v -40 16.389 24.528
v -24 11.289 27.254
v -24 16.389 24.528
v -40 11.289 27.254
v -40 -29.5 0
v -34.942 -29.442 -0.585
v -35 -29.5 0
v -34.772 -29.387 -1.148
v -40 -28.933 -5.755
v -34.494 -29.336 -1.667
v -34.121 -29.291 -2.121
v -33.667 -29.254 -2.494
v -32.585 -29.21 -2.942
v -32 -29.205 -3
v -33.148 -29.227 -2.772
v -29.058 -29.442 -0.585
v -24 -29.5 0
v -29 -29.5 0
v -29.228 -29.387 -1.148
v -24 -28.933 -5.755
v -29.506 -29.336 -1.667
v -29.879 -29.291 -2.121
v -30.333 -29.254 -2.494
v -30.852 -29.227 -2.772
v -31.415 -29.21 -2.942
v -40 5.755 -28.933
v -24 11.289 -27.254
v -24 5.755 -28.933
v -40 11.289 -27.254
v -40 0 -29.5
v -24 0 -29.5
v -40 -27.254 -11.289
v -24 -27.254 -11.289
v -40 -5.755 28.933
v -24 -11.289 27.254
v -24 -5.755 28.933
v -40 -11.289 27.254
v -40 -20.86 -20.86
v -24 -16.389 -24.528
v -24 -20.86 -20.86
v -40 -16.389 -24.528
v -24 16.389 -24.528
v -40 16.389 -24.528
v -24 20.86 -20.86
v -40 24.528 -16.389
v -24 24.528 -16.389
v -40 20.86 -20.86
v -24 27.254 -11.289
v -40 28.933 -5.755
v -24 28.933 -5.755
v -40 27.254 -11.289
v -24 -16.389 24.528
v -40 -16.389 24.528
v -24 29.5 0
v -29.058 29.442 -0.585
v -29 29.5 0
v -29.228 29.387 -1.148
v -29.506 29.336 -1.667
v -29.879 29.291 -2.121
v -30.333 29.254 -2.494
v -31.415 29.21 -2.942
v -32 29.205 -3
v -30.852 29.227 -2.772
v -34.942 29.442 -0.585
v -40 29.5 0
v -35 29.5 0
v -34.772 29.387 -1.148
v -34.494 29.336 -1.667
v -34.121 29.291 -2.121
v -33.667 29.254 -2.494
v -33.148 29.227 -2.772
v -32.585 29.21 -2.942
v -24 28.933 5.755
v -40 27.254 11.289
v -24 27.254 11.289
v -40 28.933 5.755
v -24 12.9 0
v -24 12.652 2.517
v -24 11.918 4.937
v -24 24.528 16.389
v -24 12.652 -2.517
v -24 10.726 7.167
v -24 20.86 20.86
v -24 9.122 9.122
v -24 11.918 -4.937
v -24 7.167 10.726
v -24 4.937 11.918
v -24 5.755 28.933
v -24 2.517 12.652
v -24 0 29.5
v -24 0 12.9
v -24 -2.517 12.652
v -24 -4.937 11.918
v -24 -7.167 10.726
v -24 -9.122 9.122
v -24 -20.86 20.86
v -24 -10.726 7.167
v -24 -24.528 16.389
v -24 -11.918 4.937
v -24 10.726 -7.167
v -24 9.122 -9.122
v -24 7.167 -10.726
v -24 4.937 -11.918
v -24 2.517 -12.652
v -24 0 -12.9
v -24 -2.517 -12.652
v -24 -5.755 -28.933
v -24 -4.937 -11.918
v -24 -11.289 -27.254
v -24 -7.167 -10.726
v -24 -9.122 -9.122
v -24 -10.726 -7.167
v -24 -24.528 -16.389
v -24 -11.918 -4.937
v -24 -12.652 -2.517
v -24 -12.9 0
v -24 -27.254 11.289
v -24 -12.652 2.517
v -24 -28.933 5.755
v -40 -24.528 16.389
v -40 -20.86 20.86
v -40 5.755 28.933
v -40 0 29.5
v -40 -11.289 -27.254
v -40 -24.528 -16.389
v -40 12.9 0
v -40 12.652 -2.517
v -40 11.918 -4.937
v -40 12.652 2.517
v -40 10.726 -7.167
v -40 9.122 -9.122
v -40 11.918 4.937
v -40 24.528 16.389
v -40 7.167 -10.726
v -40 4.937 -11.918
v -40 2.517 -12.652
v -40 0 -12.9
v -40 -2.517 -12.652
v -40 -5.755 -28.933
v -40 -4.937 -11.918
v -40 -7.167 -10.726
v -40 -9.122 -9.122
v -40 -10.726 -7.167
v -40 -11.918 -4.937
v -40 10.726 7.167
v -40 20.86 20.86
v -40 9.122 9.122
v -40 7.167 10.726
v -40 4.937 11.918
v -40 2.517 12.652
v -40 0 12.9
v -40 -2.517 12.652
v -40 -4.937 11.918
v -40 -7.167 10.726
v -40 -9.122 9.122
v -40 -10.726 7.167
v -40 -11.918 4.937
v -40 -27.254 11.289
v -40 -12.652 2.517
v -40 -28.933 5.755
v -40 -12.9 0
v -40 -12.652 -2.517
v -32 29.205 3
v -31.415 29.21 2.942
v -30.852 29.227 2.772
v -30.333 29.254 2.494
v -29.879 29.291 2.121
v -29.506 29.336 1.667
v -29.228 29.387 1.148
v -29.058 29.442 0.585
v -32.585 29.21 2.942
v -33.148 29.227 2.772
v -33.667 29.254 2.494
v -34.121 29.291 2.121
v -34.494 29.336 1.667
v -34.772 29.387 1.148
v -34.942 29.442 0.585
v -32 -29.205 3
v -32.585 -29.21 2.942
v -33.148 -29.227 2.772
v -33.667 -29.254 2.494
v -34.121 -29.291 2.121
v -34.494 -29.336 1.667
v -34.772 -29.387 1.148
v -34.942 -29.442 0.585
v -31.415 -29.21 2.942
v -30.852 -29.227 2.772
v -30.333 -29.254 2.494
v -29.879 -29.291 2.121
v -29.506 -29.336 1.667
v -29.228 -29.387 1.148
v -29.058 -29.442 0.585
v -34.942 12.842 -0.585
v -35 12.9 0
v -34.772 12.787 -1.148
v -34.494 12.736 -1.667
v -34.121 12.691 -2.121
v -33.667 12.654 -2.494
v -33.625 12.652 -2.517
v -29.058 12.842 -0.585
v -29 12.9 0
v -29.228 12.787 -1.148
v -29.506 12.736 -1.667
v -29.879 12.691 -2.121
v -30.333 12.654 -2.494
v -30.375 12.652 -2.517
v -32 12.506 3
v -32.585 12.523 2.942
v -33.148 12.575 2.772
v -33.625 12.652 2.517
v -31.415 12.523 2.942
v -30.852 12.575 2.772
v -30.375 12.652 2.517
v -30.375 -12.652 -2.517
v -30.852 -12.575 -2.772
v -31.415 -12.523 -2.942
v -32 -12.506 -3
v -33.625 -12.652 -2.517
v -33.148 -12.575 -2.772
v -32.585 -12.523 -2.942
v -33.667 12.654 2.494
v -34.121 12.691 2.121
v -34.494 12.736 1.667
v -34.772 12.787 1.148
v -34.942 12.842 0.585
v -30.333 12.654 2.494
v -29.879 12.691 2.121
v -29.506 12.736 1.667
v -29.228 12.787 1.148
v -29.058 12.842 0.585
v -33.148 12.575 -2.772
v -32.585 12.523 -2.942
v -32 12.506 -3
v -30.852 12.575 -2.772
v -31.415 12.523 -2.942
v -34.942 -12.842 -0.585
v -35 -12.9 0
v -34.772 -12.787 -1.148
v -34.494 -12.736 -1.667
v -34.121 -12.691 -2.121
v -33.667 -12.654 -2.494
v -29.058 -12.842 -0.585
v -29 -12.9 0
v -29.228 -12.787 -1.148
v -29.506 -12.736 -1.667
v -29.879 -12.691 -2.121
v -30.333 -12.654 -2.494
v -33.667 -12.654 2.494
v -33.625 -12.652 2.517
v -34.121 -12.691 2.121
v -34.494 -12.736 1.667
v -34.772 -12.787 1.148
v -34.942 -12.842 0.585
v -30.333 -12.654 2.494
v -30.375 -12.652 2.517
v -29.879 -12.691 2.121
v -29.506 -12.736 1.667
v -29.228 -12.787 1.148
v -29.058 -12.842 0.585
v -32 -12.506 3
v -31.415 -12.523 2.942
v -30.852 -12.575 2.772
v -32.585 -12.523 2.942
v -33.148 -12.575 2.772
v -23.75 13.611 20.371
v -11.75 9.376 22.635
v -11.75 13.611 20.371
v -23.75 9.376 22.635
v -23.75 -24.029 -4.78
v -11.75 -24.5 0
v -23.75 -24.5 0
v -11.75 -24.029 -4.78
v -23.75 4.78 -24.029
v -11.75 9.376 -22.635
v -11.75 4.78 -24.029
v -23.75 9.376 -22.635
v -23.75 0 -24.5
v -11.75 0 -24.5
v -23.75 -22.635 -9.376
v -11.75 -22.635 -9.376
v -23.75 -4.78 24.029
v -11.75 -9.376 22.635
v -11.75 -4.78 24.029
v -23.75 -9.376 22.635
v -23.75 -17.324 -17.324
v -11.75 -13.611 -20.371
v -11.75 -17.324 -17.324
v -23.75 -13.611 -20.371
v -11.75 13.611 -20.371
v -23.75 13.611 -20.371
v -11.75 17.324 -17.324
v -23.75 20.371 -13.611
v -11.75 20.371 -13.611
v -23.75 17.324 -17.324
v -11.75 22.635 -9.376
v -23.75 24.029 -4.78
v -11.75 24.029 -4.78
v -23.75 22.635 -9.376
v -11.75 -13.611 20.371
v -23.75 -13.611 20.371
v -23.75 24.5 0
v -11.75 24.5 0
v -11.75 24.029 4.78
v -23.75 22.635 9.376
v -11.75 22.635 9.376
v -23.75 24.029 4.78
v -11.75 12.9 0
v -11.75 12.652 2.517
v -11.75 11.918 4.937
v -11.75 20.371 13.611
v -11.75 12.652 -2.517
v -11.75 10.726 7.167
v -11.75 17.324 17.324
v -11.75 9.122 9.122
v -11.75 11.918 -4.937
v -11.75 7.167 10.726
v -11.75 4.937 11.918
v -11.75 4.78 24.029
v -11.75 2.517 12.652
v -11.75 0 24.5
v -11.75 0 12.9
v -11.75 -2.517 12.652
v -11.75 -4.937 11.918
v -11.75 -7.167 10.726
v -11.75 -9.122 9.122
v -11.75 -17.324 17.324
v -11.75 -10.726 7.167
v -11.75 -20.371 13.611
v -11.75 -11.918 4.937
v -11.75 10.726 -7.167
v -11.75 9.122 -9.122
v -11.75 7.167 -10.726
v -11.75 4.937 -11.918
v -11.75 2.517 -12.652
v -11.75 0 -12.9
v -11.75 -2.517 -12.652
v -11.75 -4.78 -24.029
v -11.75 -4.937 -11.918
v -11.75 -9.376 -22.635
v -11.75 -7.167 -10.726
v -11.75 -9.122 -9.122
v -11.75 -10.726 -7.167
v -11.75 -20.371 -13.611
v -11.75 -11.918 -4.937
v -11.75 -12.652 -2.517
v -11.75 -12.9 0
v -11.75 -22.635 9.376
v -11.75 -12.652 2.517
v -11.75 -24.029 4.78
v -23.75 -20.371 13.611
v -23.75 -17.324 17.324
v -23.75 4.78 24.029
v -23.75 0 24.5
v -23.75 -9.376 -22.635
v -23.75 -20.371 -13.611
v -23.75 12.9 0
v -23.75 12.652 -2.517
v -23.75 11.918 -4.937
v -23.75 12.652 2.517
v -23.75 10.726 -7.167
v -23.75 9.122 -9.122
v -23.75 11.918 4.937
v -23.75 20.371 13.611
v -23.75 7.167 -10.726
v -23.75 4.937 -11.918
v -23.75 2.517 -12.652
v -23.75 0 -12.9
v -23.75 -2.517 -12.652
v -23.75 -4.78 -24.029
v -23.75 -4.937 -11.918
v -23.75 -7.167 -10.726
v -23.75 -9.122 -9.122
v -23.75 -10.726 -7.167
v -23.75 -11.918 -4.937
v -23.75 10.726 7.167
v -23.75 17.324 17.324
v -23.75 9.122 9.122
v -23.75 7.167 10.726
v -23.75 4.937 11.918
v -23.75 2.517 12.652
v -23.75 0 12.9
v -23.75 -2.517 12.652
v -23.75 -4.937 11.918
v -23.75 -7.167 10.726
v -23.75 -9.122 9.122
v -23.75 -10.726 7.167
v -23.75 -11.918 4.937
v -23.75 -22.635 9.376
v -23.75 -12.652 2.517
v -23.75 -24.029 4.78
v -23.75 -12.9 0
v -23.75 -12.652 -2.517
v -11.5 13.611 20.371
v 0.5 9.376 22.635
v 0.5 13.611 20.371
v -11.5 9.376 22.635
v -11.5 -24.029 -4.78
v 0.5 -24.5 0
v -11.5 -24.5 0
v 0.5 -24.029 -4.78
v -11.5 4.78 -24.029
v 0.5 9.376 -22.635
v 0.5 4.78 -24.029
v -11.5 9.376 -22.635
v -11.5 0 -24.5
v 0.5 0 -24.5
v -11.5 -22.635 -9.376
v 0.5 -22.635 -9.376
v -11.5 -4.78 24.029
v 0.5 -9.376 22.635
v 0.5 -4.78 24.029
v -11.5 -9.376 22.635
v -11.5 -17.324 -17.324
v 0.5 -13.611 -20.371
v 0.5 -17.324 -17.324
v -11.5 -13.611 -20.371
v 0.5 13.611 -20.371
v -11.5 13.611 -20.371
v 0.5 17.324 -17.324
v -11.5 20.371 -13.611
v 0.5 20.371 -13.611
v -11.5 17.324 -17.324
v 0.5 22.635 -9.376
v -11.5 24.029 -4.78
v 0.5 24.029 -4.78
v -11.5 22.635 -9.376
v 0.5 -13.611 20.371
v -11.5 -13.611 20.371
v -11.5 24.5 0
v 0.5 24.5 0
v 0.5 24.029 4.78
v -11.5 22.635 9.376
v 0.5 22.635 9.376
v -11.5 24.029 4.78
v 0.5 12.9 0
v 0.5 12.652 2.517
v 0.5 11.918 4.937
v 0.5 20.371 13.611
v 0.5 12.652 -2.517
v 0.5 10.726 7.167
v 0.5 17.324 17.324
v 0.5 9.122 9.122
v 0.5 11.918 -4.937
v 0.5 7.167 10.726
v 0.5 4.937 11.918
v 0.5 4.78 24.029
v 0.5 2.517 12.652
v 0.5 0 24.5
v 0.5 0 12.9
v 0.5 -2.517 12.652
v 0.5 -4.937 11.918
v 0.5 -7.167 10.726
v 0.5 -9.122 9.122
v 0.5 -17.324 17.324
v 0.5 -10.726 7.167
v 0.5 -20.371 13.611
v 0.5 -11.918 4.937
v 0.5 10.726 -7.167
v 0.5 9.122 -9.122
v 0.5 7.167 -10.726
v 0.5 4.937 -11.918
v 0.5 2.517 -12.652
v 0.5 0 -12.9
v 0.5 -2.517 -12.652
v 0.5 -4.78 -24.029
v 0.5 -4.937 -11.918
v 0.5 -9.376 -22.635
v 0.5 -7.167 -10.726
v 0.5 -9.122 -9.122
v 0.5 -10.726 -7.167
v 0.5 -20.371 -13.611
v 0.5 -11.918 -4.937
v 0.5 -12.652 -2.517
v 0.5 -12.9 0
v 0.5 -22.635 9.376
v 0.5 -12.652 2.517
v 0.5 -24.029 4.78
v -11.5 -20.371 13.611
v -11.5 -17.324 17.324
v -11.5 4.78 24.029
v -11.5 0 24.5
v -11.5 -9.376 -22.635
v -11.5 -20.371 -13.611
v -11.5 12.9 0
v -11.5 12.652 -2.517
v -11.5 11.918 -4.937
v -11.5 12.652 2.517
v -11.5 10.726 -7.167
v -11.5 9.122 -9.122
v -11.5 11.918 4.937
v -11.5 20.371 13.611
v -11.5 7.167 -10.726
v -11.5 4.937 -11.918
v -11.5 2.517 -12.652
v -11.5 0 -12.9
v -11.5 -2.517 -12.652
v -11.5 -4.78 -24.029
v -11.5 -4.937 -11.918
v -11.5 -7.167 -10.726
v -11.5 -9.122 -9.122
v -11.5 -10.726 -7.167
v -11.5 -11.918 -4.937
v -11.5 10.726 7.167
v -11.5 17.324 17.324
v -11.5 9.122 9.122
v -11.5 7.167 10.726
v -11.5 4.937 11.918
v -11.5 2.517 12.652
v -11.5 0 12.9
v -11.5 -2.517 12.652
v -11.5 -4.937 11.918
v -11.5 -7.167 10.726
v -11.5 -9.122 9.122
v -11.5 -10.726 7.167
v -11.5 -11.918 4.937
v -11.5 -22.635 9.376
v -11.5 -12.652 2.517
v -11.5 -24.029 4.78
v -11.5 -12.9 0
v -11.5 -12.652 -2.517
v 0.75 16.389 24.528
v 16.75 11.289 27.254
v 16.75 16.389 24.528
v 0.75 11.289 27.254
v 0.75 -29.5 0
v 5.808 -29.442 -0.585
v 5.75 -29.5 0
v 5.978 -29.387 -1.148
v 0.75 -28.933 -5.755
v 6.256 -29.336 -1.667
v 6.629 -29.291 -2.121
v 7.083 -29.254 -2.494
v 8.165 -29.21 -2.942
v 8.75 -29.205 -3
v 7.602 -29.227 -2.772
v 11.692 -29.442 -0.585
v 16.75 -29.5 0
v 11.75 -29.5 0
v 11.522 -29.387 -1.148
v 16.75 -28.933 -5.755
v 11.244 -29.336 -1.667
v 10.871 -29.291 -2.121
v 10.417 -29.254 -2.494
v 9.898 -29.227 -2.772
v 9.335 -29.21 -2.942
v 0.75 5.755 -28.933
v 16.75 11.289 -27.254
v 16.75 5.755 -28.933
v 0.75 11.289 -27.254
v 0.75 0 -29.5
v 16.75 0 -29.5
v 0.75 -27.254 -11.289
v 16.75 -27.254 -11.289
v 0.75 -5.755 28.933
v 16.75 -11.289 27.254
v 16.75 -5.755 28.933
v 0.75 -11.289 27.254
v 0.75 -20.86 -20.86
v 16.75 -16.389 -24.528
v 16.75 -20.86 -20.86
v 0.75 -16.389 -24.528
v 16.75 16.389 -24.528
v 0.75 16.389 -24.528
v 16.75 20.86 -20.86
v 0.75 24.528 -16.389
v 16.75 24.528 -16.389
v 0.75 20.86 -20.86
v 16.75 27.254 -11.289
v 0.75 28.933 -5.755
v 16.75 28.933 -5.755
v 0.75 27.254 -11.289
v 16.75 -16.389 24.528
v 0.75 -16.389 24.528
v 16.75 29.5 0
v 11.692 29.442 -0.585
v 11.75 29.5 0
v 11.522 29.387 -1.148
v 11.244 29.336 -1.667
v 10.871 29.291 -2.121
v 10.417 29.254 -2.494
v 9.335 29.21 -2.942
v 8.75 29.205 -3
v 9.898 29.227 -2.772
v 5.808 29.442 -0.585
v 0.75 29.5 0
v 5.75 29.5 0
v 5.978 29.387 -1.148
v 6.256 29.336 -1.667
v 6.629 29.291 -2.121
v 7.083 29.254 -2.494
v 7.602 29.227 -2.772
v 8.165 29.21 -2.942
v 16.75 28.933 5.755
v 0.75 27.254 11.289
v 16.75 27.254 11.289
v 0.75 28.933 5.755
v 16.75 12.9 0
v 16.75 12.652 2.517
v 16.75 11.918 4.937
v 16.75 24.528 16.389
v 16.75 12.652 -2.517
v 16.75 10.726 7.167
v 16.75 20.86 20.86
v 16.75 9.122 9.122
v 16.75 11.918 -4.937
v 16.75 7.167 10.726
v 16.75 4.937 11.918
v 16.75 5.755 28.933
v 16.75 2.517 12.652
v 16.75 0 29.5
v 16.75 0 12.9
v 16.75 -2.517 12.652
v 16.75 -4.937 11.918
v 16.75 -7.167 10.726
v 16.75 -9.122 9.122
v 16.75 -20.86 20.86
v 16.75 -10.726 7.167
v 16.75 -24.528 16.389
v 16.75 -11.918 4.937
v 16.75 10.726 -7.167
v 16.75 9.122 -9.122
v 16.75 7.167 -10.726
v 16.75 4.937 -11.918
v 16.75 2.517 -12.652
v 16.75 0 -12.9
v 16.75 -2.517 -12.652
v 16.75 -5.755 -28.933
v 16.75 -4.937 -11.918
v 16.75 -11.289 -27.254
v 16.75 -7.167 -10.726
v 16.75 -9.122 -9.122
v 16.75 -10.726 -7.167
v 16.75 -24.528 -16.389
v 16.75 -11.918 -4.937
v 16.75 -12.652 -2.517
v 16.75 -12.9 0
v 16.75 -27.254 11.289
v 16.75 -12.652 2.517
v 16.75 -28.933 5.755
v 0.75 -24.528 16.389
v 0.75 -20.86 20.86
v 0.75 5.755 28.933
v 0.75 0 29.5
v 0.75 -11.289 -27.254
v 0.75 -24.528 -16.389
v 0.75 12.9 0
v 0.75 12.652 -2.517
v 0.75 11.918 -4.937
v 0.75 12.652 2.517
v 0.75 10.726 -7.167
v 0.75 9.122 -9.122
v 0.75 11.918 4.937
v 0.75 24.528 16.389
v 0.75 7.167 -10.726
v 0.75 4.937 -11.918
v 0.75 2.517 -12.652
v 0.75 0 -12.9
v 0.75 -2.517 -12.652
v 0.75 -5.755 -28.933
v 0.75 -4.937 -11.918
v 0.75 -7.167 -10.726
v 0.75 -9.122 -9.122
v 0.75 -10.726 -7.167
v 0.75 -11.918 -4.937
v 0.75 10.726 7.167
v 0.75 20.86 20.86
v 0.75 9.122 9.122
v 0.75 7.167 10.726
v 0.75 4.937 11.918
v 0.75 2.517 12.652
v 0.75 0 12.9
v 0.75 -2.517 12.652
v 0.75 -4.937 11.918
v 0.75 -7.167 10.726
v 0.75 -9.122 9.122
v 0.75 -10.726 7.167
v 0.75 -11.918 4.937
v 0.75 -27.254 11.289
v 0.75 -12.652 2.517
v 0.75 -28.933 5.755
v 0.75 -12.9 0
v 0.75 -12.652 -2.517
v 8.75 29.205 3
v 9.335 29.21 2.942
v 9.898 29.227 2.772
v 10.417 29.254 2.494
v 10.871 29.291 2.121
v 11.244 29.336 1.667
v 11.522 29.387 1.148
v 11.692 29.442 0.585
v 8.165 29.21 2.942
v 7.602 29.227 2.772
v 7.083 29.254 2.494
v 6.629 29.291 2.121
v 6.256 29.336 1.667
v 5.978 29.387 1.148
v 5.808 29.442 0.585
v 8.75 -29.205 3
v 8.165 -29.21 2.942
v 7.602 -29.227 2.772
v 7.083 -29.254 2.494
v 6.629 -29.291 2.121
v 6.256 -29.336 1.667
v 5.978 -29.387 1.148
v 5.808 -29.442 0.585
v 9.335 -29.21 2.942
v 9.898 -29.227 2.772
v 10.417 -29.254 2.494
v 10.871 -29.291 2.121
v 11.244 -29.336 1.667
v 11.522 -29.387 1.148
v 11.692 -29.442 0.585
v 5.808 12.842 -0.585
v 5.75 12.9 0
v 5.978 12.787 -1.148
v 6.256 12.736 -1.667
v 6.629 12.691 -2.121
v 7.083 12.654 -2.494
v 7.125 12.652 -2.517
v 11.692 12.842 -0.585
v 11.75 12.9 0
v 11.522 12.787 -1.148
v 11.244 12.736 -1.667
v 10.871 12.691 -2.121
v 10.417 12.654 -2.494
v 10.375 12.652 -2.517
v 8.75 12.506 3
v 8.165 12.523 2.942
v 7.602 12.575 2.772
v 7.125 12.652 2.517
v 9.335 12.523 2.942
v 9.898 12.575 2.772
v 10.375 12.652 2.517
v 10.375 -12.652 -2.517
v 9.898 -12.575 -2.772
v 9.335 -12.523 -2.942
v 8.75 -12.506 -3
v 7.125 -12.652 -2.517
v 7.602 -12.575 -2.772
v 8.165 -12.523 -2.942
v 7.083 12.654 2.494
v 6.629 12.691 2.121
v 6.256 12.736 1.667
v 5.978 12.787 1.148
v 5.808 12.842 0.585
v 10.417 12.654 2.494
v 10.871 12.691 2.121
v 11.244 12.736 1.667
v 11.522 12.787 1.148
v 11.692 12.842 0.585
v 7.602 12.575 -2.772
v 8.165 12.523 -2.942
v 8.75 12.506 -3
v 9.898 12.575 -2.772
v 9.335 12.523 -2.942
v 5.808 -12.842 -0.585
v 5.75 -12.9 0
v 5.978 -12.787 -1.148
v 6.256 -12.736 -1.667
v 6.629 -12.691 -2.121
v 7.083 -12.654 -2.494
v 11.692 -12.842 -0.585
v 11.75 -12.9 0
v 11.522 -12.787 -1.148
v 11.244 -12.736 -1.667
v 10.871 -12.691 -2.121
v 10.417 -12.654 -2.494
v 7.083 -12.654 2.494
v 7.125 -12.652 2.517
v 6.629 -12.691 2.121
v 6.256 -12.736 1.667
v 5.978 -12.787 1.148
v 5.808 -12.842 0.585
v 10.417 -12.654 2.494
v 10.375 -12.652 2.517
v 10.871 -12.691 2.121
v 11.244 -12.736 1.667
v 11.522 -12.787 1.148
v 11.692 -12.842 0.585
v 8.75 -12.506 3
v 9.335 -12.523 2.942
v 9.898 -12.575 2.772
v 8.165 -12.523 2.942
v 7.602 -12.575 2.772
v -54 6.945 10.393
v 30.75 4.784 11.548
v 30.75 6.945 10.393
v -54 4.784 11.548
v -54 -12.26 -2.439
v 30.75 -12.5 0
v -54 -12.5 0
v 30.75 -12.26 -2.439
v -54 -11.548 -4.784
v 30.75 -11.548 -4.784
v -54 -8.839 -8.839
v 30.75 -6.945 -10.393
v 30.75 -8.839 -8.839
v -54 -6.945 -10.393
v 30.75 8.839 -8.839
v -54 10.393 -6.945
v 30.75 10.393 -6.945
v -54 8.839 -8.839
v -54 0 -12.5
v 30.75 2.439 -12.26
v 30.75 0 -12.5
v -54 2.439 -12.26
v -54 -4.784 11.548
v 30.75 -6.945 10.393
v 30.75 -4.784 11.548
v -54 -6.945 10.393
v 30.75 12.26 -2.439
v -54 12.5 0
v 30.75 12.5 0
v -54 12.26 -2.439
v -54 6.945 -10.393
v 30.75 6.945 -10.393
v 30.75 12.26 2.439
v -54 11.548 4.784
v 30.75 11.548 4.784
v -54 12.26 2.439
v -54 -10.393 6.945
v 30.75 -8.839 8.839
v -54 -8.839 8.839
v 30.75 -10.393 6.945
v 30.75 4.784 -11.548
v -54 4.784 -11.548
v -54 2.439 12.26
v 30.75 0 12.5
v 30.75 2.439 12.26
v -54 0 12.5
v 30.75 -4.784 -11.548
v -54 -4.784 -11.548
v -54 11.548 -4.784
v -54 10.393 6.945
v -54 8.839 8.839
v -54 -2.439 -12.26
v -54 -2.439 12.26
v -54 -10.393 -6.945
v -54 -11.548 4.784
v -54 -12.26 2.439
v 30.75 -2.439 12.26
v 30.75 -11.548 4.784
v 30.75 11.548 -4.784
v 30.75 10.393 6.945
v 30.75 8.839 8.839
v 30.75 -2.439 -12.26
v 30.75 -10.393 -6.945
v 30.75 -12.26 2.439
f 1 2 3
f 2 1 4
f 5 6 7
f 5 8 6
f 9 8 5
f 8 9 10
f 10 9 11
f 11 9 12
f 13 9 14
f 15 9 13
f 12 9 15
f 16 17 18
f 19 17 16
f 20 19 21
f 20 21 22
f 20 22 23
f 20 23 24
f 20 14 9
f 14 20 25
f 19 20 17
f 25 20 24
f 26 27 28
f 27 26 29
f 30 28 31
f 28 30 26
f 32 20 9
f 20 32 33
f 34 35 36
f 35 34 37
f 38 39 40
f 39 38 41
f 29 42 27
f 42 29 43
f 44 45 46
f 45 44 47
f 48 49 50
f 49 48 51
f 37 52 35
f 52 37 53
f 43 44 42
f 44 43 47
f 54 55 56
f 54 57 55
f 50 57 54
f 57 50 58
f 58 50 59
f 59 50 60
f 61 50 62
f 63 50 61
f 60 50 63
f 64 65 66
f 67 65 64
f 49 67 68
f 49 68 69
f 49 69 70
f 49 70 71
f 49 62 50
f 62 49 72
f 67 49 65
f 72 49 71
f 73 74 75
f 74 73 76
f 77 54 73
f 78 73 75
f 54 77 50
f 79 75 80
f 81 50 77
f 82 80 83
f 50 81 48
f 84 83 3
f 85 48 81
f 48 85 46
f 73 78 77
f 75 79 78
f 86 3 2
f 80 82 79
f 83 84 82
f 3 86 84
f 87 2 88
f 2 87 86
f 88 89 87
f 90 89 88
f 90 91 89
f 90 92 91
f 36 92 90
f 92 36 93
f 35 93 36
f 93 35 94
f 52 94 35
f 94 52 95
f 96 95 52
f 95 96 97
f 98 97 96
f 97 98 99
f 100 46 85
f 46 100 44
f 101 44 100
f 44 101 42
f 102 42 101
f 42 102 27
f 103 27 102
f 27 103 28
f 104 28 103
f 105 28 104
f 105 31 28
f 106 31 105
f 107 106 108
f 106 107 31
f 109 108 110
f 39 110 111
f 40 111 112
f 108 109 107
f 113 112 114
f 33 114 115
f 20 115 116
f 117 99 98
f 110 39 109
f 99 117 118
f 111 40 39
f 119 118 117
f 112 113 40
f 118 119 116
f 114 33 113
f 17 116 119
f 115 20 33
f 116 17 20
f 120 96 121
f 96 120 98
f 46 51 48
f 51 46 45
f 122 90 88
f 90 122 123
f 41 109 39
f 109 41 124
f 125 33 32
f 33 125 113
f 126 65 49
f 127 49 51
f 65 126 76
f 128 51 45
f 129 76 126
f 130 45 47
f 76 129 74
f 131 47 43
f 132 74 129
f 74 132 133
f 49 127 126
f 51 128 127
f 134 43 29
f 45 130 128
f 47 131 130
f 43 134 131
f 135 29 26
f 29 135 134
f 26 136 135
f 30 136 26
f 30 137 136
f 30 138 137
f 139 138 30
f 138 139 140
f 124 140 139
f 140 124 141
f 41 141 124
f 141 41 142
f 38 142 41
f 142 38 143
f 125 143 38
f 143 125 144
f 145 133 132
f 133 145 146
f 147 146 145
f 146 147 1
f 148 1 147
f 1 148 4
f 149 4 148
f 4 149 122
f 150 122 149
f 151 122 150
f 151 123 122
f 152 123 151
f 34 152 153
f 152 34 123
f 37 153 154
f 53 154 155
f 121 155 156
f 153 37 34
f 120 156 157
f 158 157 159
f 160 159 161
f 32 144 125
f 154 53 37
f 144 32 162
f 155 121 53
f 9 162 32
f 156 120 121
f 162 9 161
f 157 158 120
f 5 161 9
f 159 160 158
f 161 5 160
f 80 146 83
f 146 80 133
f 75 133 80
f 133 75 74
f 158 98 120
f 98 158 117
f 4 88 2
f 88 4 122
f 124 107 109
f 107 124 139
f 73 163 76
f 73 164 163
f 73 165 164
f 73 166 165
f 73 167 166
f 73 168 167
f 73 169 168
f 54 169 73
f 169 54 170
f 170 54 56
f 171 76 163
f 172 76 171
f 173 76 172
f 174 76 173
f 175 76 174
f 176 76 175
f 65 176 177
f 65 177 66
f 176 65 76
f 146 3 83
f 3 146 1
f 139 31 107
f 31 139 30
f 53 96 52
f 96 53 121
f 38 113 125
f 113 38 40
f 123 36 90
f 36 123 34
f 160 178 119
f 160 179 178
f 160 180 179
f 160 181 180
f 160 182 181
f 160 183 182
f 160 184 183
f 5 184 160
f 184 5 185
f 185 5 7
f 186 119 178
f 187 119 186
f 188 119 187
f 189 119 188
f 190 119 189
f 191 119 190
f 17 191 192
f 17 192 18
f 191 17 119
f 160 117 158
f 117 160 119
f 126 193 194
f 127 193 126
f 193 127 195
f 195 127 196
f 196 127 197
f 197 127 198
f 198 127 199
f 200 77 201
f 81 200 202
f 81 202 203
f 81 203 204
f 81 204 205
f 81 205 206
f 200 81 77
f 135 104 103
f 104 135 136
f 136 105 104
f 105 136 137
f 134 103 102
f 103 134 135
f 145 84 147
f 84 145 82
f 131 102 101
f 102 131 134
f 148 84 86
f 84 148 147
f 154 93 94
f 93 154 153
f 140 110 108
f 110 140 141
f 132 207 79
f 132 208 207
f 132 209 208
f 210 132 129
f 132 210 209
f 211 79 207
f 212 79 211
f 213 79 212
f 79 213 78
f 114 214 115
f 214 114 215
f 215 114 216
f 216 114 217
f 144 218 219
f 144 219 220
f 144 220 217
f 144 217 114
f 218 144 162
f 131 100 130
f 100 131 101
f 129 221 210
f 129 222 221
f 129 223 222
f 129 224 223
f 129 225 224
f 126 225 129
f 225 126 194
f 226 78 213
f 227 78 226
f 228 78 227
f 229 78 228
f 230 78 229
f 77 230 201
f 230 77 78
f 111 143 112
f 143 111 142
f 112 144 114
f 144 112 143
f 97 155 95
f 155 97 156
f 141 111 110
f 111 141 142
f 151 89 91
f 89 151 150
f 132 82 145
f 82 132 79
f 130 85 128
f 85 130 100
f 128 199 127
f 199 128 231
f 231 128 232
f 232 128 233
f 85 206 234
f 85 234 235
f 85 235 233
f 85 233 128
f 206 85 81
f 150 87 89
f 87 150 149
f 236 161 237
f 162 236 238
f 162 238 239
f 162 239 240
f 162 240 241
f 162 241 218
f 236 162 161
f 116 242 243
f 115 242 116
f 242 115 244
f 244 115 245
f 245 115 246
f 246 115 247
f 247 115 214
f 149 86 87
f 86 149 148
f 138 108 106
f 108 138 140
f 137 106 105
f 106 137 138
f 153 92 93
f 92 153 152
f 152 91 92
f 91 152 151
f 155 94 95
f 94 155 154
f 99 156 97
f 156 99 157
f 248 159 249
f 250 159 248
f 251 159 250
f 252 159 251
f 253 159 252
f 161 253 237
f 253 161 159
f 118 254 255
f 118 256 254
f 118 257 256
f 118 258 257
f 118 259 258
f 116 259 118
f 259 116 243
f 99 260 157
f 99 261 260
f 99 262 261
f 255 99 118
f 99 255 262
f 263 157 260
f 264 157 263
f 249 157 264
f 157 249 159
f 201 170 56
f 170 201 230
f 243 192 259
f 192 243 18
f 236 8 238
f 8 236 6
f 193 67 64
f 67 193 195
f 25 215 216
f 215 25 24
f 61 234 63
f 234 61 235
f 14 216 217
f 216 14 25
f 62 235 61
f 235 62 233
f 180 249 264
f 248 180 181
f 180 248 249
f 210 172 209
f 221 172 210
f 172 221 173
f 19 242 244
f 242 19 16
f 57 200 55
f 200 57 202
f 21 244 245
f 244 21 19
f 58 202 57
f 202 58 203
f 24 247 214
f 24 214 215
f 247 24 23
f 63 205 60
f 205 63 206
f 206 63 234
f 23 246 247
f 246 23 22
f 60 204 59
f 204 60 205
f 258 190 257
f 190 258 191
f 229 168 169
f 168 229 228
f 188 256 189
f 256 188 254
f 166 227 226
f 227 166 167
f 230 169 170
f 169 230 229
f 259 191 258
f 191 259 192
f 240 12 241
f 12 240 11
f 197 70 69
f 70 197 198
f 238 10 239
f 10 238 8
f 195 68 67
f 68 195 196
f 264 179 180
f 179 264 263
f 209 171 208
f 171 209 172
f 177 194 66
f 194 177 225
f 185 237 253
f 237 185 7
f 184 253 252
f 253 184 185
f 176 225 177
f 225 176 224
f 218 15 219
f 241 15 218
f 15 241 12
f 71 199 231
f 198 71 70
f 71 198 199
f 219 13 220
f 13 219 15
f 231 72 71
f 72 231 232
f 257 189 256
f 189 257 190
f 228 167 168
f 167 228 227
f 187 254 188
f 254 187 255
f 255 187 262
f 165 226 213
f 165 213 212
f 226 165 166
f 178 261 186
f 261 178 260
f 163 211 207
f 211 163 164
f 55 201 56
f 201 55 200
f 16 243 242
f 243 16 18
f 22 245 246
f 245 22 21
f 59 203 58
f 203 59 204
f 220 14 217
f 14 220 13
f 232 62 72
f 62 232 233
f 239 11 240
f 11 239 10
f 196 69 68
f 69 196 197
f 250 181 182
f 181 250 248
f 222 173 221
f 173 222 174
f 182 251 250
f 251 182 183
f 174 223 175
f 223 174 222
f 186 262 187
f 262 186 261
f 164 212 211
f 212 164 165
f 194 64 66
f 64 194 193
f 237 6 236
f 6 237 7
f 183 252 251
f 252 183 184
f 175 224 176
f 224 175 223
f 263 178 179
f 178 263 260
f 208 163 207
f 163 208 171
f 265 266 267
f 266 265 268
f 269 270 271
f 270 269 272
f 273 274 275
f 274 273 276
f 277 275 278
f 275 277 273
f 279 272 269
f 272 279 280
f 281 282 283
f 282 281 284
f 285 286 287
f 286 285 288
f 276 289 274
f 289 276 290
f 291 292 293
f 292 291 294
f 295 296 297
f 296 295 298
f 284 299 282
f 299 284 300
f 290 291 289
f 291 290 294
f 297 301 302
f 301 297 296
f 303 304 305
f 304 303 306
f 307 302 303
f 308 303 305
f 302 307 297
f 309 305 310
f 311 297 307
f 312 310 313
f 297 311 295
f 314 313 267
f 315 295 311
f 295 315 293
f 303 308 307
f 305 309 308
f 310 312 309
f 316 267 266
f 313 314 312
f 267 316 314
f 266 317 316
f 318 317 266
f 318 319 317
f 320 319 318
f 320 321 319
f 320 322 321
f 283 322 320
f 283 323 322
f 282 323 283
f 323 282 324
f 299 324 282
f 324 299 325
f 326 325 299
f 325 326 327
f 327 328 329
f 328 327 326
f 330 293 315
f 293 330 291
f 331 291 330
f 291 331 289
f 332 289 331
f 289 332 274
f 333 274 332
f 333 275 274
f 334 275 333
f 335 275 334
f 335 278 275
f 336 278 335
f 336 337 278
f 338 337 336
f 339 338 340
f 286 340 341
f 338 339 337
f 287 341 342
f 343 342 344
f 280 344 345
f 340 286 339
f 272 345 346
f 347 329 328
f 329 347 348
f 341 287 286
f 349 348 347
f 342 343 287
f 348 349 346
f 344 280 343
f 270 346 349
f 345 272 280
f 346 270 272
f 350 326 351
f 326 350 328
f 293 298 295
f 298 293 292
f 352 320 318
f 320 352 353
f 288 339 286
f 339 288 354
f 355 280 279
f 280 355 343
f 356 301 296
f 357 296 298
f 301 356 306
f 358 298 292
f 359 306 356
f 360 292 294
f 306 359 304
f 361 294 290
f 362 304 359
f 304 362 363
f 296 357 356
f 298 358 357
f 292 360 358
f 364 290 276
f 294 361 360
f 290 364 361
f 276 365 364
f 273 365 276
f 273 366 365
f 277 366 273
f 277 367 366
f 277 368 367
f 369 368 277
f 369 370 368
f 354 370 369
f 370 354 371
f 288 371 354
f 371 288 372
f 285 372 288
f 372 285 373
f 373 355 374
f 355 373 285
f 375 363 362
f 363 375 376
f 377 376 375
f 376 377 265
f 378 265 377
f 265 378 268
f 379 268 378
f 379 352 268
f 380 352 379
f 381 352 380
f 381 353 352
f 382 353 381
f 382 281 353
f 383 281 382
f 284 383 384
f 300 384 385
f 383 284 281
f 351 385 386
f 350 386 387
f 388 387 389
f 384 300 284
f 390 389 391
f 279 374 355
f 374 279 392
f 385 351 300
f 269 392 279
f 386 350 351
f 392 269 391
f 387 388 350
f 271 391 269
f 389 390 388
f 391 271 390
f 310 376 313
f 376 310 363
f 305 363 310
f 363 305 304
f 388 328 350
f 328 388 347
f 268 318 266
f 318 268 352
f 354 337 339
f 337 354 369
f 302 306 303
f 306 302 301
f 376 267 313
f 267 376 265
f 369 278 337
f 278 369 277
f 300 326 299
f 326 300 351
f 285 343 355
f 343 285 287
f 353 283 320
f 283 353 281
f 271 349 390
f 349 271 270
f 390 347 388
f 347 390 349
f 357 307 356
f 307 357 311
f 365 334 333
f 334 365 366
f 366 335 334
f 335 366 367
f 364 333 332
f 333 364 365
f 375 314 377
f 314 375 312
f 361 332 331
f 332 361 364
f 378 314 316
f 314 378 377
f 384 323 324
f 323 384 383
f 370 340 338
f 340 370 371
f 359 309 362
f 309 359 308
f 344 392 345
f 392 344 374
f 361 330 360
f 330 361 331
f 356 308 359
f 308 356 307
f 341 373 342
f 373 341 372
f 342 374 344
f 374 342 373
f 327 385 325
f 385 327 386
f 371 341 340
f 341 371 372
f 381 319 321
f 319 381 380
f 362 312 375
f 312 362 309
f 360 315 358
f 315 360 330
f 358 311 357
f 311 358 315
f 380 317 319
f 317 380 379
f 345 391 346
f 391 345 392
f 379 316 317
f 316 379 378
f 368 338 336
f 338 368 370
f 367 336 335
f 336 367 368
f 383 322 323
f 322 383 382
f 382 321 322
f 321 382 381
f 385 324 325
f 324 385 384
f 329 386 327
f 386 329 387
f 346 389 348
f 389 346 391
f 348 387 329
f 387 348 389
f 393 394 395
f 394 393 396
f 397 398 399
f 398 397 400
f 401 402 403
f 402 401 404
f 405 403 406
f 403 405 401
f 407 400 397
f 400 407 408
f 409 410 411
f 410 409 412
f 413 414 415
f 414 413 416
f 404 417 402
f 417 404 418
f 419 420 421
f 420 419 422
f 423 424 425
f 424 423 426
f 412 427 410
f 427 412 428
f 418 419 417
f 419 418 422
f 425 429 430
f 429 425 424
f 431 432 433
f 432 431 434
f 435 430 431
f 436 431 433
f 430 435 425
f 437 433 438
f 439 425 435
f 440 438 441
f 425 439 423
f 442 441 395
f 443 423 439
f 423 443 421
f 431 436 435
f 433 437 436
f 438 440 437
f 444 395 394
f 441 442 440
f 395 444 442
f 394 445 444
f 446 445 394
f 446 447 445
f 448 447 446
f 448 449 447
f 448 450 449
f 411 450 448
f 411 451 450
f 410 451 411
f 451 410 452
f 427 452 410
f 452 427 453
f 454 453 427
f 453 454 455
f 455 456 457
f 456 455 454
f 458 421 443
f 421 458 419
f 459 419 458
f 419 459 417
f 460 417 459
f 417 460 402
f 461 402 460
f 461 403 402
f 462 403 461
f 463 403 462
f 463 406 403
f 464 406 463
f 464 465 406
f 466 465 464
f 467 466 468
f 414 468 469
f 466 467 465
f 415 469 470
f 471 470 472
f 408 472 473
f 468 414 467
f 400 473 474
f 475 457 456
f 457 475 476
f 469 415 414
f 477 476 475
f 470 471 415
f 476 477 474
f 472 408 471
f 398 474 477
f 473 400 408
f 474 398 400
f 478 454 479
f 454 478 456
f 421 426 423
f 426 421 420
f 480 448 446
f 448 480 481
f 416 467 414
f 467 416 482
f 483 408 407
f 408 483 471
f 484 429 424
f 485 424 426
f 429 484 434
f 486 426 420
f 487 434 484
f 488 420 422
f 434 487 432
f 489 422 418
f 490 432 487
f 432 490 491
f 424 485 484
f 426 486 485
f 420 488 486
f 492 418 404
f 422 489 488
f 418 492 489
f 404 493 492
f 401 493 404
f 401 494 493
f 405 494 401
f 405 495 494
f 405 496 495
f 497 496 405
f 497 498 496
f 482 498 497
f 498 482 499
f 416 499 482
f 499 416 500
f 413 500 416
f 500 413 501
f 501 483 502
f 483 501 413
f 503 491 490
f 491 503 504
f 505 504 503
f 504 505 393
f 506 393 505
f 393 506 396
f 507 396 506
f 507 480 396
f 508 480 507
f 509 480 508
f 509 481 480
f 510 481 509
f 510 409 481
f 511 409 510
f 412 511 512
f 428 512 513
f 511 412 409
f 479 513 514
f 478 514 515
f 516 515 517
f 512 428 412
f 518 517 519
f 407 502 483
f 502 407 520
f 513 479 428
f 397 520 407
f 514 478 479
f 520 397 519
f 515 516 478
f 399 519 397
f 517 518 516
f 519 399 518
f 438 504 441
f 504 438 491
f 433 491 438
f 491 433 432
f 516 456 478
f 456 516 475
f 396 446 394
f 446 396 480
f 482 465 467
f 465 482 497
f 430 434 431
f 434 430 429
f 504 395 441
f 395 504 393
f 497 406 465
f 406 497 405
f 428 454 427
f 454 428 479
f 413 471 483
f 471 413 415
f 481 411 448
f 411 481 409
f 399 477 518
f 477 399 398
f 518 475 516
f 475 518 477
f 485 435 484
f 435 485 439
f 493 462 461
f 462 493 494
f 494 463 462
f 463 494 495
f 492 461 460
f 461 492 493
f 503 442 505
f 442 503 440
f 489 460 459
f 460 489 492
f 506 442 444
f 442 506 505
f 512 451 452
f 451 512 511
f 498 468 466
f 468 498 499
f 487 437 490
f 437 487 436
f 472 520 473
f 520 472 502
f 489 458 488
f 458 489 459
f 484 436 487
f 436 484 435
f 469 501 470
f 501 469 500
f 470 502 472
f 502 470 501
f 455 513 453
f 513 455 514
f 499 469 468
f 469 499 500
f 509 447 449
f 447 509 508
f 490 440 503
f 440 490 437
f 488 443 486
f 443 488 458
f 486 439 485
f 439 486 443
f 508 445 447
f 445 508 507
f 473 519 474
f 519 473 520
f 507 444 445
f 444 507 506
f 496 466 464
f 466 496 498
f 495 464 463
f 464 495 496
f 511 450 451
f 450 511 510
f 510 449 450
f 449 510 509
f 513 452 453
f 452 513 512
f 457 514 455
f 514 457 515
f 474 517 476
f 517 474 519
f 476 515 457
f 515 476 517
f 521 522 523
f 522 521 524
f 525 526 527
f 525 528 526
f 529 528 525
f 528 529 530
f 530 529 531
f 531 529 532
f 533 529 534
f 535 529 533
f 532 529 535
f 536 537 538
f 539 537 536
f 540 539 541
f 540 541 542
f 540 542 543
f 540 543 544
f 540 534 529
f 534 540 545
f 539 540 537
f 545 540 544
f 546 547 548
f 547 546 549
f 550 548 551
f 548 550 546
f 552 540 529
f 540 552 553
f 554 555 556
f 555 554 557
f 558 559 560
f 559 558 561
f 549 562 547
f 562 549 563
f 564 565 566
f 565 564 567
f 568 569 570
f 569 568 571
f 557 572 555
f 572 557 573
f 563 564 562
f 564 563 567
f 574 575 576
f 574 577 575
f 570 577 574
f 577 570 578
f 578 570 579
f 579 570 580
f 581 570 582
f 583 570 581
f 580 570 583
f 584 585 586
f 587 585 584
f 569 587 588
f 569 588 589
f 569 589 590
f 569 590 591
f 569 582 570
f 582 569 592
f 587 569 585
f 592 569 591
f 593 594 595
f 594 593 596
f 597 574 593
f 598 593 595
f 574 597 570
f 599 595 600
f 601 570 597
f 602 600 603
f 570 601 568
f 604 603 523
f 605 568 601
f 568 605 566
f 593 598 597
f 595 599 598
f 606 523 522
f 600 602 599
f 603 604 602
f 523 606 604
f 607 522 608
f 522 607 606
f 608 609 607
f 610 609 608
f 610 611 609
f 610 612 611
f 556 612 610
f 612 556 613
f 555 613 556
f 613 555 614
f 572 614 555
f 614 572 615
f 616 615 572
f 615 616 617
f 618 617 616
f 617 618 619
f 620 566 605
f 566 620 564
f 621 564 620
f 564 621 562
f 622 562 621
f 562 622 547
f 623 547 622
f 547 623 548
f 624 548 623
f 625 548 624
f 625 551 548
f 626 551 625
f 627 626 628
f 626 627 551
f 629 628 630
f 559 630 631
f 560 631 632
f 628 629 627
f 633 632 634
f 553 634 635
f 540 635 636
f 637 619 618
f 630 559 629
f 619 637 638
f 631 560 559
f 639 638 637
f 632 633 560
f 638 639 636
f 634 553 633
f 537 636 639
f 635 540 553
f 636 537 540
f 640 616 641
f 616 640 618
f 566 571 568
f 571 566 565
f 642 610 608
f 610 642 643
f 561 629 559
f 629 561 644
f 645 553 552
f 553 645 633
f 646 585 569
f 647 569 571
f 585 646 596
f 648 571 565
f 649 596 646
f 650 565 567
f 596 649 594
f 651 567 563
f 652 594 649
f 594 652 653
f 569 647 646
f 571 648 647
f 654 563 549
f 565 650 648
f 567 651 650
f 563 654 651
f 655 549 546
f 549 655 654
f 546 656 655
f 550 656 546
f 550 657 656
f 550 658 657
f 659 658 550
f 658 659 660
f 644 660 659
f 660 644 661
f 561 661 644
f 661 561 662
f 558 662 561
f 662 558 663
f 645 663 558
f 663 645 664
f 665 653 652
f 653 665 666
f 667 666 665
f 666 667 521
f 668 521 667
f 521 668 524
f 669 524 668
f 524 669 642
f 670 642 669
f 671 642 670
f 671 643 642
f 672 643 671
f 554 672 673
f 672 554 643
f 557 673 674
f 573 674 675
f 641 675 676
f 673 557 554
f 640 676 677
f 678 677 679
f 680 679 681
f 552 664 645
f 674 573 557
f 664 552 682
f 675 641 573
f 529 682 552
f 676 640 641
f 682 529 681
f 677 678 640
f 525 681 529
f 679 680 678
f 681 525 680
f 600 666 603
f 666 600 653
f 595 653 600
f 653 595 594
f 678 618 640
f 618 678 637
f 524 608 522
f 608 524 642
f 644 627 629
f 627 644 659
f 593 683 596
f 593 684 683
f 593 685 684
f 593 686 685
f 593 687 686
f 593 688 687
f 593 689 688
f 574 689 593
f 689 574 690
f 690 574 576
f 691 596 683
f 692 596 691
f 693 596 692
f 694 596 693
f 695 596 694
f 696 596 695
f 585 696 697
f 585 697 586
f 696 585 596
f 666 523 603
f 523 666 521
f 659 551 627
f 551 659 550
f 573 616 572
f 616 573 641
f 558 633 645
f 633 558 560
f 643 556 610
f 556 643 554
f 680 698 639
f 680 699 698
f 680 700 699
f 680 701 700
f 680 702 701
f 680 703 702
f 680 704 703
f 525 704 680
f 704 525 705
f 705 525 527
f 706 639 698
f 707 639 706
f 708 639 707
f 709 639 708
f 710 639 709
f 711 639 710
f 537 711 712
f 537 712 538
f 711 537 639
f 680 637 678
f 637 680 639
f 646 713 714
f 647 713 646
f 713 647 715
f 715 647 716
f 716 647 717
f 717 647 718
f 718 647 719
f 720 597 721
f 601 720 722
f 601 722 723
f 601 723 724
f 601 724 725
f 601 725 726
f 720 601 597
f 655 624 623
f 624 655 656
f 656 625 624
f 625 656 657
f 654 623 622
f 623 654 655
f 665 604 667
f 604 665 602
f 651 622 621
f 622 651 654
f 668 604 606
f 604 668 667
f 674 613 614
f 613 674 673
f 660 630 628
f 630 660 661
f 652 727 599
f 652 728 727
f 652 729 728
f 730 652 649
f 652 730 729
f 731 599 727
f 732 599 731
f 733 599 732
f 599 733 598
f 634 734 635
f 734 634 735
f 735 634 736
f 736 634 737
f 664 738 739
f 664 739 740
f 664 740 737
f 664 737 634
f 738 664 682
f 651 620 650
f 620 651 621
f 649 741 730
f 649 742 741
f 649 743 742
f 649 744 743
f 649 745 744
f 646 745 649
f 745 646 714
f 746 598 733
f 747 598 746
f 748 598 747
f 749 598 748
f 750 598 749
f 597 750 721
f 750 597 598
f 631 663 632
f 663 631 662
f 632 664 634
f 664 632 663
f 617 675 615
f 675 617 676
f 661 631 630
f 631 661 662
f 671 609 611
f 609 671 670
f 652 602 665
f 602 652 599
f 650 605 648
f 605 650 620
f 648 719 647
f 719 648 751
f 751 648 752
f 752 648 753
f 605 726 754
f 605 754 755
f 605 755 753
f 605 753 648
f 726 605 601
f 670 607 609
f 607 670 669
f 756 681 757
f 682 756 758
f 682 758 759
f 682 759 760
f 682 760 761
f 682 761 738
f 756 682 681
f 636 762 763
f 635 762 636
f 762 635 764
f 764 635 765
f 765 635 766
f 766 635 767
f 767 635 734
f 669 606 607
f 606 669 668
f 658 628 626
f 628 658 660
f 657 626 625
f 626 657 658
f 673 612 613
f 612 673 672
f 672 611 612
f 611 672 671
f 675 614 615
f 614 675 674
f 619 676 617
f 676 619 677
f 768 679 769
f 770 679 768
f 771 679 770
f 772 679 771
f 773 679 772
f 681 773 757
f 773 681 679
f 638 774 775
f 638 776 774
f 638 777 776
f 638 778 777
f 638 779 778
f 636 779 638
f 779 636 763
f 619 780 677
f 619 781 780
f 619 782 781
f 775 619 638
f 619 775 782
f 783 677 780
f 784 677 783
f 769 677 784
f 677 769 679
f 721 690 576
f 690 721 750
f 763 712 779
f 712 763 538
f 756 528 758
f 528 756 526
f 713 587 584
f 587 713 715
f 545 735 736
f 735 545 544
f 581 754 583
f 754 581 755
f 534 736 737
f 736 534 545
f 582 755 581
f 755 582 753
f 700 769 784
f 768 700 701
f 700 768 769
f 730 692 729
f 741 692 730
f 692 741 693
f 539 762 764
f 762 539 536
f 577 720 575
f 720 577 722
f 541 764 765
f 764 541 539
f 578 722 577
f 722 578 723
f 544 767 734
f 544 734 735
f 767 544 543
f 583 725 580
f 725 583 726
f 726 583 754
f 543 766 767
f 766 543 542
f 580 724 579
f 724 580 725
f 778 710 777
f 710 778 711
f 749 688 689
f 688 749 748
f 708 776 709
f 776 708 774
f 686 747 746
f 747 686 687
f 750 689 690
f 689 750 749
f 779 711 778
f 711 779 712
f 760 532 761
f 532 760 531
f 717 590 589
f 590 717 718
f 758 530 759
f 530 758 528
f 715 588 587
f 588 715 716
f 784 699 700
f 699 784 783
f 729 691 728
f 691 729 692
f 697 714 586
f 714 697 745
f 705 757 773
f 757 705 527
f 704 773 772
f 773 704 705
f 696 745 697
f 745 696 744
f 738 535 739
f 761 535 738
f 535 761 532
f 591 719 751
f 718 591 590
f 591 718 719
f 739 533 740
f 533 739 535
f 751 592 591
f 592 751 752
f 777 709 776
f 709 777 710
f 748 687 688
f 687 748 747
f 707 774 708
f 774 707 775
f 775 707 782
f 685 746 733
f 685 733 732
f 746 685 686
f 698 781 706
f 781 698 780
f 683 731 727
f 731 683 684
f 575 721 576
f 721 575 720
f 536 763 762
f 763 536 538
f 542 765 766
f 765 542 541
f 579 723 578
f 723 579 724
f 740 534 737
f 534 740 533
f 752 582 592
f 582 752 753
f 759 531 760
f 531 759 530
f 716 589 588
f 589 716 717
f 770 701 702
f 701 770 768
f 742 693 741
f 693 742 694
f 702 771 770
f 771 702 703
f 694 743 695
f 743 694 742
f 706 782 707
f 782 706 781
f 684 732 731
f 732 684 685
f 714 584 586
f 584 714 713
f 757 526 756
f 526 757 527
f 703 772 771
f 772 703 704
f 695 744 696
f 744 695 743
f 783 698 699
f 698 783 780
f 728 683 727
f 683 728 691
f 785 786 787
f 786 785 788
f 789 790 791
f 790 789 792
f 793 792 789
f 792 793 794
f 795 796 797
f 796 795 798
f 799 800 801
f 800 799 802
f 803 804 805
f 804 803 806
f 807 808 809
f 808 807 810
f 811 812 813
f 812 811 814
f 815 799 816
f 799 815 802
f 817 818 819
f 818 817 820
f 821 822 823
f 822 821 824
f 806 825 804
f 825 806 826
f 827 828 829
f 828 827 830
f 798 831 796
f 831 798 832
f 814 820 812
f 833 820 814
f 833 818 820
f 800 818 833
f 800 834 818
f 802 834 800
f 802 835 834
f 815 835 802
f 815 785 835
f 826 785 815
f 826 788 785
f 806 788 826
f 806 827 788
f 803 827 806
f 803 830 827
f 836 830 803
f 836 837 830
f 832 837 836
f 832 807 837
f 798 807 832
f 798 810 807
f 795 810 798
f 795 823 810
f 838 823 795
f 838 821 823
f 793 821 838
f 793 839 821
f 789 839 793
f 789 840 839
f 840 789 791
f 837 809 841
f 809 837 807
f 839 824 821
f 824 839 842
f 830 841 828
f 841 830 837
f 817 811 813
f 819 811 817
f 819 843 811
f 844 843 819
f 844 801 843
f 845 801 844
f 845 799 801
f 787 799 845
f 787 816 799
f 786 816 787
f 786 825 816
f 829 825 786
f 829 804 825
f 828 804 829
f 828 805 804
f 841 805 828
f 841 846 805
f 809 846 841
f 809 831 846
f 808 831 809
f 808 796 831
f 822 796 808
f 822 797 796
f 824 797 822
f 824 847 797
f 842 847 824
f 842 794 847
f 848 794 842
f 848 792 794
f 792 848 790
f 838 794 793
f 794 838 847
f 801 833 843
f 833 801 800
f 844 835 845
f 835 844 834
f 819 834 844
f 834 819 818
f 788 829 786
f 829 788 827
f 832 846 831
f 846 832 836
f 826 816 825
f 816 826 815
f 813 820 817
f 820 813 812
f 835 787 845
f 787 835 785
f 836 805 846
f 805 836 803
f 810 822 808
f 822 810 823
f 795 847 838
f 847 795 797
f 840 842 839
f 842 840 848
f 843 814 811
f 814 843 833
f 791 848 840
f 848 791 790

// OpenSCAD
$fn = 32;

// ------------------------------------------------------------------------
// Shaft with rings and collars: d25 shaft, 4 rings
// Every part is its own module, assembly() places them once.
// ------------------------------------------------------------------------

// --- part 1 ---
module shaft() {
  translate([0, 0, -42.375]) cylinder(h = 84.75, d = 25);
}

// --- part 2 ---
module collar_a() {
  difference() {
    cylinder(h = 16, d = 59);
    translate([0, 0, -1]) cylinder(h = 18, d = 25.8);
    translate([0, 0, 8]) rotate([90, 0, 0]) cylinder(h = 61, d = 6, center = true);
  }
}

// --- part 3 ---
module spacer_a() {
  difference() {
      translate([0, 0, 0]) cylinder(h = 12, d = 49);
      translate([0, 0, -1]) cylinder(h = 14, d = 25.8);
    }
}

// --- part 4 ---
module spacer_b() {
  difference() {
      translate([0, 0, 0]) cylinder(h = 12, d = 49);
      translate([0, 0, -1]) cylinder(h = 14, d = 25.8);
    }
}

// --- part 5 ---
module collar_b() {
  difference() {
    cylinder(h = 16, d = 59);
    translate([0, 0, -1]) cylinder(h = 18, d = 25.8);
    translate([0, 0, 8]) rotate([90, 0, 0]) cylinder(h = 61, d = 6, center = true);
  }
}

// --- assembly ---
module assembly() {
  translate([-11.625, 0, 0]) rotate([0, 90, 0]) shaft();
  translate([-40, 0, 0]) rotate([0, 90, 0]) collar_a();
  translate([-23.75, 0, 0]) rotate([0, 90, 0]) spacer_a();
  translate([-11.5, 0, 0]) rotate([0, 90, 0]) spacer_b();
  translate([0.75, 0, 0]) rotate([0, 90, 0]) collar_b();
}

assembly();
